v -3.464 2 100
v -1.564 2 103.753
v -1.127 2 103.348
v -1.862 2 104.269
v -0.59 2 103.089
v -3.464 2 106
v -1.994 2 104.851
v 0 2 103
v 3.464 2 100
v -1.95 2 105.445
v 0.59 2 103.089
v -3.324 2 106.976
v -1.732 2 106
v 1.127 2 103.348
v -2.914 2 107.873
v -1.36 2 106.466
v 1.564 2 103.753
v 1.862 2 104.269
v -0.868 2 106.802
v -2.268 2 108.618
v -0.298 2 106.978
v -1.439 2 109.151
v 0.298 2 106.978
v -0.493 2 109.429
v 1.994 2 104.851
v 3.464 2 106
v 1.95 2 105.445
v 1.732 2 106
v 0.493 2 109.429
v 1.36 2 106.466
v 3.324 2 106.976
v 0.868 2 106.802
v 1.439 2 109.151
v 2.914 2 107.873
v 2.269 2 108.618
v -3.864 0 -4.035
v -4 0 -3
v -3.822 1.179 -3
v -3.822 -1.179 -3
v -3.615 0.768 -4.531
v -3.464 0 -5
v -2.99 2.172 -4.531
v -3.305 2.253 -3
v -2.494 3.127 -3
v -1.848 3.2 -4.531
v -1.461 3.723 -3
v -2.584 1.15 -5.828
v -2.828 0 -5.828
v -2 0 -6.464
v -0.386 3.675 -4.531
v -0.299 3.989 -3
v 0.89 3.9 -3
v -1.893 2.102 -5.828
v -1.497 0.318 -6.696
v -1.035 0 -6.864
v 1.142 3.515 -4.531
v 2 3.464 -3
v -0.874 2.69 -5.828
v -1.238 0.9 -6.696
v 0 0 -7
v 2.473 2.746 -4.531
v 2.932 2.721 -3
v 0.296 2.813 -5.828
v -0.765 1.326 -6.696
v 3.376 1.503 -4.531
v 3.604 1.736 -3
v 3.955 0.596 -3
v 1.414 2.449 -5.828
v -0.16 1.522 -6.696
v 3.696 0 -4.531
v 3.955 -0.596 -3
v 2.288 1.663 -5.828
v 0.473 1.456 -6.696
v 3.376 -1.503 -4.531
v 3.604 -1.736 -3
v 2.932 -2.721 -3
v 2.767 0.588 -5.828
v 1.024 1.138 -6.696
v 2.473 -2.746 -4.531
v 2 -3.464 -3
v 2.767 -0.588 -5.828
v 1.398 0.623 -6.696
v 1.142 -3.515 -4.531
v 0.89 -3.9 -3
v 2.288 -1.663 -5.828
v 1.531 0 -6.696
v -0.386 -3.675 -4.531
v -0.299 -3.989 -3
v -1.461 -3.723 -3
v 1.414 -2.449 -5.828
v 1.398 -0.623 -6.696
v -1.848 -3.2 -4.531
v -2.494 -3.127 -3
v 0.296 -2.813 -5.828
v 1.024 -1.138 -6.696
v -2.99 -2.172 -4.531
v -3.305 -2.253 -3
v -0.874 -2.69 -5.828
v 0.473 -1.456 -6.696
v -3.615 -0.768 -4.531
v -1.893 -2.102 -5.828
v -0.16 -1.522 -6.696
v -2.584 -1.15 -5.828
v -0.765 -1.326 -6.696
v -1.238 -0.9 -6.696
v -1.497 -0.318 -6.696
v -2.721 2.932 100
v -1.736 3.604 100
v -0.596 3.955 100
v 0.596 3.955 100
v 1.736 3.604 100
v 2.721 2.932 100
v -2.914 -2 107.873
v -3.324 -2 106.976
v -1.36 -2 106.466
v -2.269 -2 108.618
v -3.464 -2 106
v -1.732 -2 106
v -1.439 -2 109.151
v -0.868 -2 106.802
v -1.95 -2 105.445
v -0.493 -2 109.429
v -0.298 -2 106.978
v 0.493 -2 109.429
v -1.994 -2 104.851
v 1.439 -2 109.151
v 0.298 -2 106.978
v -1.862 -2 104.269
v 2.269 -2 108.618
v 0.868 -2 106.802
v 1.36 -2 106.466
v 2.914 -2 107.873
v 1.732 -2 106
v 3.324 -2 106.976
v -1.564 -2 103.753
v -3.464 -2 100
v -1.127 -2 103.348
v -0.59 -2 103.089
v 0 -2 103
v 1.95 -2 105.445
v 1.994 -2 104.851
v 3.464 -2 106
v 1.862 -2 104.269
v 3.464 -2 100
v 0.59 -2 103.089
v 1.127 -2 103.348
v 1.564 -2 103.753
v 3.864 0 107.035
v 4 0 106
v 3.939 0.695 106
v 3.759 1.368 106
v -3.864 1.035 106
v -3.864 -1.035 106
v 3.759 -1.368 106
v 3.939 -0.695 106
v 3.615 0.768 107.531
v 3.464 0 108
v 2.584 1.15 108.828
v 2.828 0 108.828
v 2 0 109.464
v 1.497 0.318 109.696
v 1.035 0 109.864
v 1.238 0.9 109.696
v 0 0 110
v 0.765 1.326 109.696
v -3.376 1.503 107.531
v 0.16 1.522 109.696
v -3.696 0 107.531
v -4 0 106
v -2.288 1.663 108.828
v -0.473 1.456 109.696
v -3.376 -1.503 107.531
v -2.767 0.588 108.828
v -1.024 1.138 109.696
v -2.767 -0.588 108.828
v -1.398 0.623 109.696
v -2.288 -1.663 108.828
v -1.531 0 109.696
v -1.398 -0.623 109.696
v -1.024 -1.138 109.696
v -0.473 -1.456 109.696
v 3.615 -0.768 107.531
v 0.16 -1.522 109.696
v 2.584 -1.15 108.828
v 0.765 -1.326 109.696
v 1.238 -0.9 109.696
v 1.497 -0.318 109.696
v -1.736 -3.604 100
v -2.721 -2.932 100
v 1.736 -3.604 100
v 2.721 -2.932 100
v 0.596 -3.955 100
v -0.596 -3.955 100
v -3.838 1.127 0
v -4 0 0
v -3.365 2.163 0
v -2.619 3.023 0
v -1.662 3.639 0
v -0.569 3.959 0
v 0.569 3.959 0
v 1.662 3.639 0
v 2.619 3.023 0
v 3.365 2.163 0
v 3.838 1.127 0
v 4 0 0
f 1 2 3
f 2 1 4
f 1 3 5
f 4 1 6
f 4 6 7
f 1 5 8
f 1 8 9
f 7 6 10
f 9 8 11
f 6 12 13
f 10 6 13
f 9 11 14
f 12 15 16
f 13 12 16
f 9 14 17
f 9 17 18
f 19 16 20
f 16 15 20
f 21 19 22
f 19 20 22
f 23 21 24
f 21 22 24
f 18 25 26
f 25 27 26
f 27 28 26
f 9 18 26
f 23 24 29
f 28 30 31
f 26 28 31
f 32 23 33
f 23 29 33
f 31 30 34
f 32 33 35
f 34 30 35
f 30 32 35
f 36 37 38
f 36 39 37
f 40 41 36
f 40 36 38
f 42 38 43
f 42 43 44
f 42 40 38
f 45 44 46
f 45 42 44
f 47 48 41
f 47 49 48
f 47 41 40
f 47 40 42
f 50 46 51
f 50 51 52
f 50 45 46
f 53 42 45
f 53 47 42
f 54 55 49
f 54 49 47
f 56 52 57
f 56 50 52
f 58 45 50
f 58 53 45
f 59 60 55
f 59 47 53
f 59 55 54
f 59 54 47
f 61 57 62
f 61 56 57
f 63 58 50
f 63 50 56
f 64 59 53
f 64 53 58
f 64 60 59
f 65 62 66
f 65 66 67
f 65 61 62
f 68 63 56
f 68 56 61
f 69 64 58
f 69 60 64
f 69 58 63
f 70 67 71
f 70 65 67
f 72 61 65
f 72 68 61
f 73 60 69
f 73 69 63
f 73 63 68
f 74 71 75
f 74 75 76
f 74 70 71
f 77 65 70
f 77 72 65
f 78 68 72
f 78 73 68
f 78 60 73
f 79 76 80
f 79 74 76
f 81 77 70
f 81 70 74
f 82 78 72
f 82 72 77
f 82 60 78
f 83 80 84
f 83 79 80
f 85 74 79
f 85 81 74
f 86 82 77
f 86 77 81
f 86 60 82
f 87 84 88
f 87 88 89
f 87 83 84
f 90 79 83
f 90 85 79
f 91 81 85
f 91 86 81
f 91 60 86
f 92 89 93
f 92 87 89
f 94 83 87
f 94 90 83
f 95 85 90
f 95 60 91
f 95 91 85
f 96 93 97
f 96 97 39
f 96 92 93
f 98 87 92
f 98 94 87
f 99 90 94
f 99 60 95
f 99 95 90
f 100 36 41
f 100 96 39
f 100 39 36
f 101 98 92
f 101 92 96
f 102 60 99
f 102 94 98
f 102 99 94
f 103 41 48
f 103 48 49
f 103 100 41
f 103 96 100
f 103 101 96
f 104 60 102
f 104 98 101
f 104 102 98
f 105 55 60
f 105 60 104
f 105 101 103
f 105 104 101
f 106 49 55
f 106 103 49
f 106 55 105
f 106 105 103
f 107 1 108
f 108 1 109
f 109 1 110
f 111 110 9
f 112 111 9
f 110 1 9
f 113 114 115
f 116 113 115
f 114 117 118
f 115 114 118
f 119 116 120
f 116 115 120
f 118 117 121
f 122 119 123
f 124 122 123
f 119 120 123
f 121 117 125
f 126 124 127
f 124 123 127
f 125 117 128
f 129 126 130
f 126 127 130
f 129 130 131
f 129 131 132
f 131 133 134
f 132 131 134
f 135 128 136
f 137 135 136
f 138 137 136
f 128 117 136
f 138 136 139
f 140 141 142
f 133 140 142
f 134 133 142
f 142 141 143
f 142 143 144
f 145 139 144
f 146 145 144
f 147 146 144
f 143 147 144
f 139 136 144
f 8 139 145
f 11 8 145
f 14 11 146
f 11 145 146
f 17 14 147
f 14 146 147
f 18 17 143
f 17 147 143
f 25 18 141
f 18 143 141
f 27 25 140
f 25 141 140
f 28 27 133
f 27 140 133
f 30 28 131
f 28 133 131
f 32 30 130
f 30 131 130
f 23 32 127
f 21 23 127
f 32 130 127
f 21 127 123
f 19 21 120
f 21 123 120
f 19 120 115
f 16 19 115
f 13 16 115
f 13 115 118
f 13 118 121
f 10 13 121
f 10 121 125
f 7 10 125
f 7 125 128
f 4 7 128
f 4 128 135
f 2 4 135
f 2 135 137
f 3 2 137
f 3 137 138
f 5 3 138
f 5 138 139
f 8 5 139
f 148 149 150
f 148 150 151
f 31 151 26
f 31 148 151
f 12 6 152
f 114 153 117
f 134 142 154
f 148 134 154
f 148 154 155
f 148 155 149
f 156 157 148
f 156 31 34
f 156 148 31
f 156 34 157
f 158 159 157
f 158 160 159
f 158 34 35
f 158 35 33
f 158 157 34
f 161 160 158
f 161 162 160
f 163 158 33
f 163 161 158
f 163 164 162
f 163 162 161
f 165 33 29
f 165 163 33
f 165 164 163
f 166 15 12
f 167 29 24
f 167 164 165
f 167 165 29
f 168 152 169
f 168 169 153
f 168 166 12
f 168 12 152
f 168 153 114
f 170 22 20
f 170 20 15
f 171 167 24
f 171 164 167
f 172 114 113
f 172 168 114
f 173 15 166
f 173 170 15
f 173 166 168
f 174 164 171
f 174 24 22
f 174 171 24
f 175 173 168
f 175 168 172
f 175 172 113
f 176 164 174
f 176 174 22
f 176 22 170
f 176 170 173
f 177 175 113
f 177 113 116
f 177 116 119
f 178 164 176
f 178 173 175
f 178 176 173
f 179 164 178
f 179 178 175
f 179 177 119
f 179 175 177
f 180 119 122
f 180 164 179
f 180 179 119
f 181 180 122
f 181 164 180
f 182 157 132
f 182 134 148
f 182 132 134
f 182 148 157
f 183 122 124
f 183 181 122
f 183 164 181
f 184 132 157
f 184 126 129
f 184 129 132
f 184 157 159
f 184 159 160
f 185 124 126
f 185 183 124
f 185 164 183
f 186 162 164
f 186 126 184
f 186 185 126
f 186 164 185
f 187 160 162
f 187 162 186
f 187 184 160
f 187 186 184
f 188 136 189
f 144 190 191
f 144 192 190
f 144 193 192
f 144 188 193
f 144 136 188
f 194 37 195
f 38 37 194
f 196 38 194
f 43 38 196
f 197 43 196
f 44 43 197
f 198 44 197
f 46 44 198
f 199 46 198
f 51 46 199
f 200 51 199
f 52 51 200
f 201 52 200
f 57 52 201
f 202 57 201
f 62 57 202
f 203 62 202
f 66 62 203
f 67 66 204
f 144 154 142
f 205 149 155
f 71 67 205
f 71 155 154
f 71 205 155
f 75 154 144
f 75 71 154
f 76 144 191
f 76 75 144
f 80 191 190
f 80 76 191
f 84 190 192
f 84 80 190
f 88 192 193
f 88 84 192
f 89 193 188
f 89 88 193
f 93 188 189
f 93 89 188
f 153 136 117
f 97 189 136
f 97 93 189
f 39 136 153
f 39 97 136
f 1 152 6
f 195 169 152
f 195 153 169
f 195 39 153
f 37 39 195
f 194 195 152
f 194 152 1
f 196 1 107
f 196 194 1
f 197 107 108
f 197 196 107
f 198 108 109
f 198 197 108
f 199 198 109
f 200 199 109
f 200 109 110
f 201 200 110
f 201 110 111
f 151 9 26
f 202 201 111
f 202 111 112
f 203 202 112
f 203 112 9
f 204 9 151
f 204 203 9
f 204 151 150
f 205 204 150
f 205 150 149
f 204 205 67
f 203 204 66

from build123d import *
from build123d.topology import SkipClean

# Parameters (mm, degrees)
SZKIC1_R                    = 4
DODANIE_WYCI_GNI_CIE1_DEPTH = 110
ZAOKR_GLENIE6_R             = 4
WYTNIJ_WYCI_GNI_CIE4_START  = -2
SZKIC2_W                    = 8
SZKIC2_H                    = 10
WYTNIJ_WYCI_GNI_CIE4_DEPTH  = 2
WYTNIJ_WYCI_GNI_CIE5_START  = -4
SZKIC5_W                    = 6.92820323
SZKIC5_H                    = 10
WYTNIJ_WYCI_GNI_CIE5_DEPTH  = 2
WYTNIJ_WYCI_GNI_CIE6_REACH  = 112.236
SZKIC6_R                    = 2
DODANIE_WYCI_GNI_CIE2_START = 7
SZKIC8_R                    = 4
DODANIE_WYCI_GNI_CIE2_DEPTH = 7
ZAOKR_GLENIE7_R             = 4


with BuildPart() as part:
    # Szkic1 → Dodanie-wyciągnięcie1 (new body)
    with BuildSketch(Plane.XY):
        Circle(SZKIC1_R)
    extrude(amount=DODANIE_WYCI_GNI_CIE1_DEPTH)

    # Zaokrąglenie6
    zaokr_glenie6_edges = [part.edges().sort_by_distance(p)[0] for p in [
        (-4, 0, 110),
    ]]
    fillet(zaokr_glenie6_edges, radius=ZAOKR_GLENIE6_R)

    # Szkic2 → Wytnij-wyciągnięcie4 (cut)
    with BuildSketch(Plane(origin=(0, 0, 0), x_dir=(1, 0, 0), z_dir=(0, 1, 0)).offset(WYTNIJ_WYCI_GNI_CIE4_START)):
        with Locations((0, -105)):
            Rectangle(SZKIC2_W, SZKIC2_H)
    extrude(amount=-WYTNIJ_WYCI_GNI_CIE4_DEPTH, mode=Mode.SUBTRACT)

    # Szkic5 → Wytnij-wyciągnięcie5 (cut)
    with BuildSketch(Plane.XZ.offset(2).offset(WYTNIJ_WYCI_GNI_CIE5_START)):
        with Locations((0, 105)):
            Rectangle(SZKIC5_W, SZKIC5_H)
    extrude(amount=-WYTNIJ_WYCI_GNI_CIE5_DEPTH, mode=Mode.SUBTRACT)

    # Szkic6 → Wytnij-wyciągnięcie6 (cut, up to next)
    with BuildSketch(Plane.XZ.offset(2), mode=Mode.PRIVATE) as wytnij_wyci_gni_cie6_sk1:
        with Locations((0, 105)):
            Circle(SZKIC6_R)
    wytnij_wyci_gni_cie6_tool1 = extrude(wytnij_wyci_gni_cie6_sk1.sketch, amount=-WYTNIJ_WYCI_GNI_CIE6_REACH, mode=Mode.PRIVATE) & part.part
    add(wytnij_wyci_gni_cie6_tool1.solids().sort_by_distance((0, -2, 105))[0], mode=Mode.SUBTRACT)

    # Szkic8 → Dodanie-wyciągnięcie2 (add)
    with SkipClean():  # the faces are left unmerged after this step: merging them gives an invalid solid
        with BuildSketch(Plane(origin=(0, 0, 0), x_dir=(-1, 0, 0), z_dir=(0, 0, -1)).offset(DODANIE_WYCI_GNI_CIE2_START)):
            Circle(SZKIC8_R)
        extrude(amount=-DODANIE_WYCI_GNI_CIE2_DEPTH)

    # Zaokrąglenie7
    zaokr_glenie7_edges = [part.edges().sort_by_distance(p)[0] for p in [
        (4, 0, -7),
    ]]
    fillet(zaokr_glenie7_edges, radius=ZAOKR_GLENIE7_R)


solid = part.part
